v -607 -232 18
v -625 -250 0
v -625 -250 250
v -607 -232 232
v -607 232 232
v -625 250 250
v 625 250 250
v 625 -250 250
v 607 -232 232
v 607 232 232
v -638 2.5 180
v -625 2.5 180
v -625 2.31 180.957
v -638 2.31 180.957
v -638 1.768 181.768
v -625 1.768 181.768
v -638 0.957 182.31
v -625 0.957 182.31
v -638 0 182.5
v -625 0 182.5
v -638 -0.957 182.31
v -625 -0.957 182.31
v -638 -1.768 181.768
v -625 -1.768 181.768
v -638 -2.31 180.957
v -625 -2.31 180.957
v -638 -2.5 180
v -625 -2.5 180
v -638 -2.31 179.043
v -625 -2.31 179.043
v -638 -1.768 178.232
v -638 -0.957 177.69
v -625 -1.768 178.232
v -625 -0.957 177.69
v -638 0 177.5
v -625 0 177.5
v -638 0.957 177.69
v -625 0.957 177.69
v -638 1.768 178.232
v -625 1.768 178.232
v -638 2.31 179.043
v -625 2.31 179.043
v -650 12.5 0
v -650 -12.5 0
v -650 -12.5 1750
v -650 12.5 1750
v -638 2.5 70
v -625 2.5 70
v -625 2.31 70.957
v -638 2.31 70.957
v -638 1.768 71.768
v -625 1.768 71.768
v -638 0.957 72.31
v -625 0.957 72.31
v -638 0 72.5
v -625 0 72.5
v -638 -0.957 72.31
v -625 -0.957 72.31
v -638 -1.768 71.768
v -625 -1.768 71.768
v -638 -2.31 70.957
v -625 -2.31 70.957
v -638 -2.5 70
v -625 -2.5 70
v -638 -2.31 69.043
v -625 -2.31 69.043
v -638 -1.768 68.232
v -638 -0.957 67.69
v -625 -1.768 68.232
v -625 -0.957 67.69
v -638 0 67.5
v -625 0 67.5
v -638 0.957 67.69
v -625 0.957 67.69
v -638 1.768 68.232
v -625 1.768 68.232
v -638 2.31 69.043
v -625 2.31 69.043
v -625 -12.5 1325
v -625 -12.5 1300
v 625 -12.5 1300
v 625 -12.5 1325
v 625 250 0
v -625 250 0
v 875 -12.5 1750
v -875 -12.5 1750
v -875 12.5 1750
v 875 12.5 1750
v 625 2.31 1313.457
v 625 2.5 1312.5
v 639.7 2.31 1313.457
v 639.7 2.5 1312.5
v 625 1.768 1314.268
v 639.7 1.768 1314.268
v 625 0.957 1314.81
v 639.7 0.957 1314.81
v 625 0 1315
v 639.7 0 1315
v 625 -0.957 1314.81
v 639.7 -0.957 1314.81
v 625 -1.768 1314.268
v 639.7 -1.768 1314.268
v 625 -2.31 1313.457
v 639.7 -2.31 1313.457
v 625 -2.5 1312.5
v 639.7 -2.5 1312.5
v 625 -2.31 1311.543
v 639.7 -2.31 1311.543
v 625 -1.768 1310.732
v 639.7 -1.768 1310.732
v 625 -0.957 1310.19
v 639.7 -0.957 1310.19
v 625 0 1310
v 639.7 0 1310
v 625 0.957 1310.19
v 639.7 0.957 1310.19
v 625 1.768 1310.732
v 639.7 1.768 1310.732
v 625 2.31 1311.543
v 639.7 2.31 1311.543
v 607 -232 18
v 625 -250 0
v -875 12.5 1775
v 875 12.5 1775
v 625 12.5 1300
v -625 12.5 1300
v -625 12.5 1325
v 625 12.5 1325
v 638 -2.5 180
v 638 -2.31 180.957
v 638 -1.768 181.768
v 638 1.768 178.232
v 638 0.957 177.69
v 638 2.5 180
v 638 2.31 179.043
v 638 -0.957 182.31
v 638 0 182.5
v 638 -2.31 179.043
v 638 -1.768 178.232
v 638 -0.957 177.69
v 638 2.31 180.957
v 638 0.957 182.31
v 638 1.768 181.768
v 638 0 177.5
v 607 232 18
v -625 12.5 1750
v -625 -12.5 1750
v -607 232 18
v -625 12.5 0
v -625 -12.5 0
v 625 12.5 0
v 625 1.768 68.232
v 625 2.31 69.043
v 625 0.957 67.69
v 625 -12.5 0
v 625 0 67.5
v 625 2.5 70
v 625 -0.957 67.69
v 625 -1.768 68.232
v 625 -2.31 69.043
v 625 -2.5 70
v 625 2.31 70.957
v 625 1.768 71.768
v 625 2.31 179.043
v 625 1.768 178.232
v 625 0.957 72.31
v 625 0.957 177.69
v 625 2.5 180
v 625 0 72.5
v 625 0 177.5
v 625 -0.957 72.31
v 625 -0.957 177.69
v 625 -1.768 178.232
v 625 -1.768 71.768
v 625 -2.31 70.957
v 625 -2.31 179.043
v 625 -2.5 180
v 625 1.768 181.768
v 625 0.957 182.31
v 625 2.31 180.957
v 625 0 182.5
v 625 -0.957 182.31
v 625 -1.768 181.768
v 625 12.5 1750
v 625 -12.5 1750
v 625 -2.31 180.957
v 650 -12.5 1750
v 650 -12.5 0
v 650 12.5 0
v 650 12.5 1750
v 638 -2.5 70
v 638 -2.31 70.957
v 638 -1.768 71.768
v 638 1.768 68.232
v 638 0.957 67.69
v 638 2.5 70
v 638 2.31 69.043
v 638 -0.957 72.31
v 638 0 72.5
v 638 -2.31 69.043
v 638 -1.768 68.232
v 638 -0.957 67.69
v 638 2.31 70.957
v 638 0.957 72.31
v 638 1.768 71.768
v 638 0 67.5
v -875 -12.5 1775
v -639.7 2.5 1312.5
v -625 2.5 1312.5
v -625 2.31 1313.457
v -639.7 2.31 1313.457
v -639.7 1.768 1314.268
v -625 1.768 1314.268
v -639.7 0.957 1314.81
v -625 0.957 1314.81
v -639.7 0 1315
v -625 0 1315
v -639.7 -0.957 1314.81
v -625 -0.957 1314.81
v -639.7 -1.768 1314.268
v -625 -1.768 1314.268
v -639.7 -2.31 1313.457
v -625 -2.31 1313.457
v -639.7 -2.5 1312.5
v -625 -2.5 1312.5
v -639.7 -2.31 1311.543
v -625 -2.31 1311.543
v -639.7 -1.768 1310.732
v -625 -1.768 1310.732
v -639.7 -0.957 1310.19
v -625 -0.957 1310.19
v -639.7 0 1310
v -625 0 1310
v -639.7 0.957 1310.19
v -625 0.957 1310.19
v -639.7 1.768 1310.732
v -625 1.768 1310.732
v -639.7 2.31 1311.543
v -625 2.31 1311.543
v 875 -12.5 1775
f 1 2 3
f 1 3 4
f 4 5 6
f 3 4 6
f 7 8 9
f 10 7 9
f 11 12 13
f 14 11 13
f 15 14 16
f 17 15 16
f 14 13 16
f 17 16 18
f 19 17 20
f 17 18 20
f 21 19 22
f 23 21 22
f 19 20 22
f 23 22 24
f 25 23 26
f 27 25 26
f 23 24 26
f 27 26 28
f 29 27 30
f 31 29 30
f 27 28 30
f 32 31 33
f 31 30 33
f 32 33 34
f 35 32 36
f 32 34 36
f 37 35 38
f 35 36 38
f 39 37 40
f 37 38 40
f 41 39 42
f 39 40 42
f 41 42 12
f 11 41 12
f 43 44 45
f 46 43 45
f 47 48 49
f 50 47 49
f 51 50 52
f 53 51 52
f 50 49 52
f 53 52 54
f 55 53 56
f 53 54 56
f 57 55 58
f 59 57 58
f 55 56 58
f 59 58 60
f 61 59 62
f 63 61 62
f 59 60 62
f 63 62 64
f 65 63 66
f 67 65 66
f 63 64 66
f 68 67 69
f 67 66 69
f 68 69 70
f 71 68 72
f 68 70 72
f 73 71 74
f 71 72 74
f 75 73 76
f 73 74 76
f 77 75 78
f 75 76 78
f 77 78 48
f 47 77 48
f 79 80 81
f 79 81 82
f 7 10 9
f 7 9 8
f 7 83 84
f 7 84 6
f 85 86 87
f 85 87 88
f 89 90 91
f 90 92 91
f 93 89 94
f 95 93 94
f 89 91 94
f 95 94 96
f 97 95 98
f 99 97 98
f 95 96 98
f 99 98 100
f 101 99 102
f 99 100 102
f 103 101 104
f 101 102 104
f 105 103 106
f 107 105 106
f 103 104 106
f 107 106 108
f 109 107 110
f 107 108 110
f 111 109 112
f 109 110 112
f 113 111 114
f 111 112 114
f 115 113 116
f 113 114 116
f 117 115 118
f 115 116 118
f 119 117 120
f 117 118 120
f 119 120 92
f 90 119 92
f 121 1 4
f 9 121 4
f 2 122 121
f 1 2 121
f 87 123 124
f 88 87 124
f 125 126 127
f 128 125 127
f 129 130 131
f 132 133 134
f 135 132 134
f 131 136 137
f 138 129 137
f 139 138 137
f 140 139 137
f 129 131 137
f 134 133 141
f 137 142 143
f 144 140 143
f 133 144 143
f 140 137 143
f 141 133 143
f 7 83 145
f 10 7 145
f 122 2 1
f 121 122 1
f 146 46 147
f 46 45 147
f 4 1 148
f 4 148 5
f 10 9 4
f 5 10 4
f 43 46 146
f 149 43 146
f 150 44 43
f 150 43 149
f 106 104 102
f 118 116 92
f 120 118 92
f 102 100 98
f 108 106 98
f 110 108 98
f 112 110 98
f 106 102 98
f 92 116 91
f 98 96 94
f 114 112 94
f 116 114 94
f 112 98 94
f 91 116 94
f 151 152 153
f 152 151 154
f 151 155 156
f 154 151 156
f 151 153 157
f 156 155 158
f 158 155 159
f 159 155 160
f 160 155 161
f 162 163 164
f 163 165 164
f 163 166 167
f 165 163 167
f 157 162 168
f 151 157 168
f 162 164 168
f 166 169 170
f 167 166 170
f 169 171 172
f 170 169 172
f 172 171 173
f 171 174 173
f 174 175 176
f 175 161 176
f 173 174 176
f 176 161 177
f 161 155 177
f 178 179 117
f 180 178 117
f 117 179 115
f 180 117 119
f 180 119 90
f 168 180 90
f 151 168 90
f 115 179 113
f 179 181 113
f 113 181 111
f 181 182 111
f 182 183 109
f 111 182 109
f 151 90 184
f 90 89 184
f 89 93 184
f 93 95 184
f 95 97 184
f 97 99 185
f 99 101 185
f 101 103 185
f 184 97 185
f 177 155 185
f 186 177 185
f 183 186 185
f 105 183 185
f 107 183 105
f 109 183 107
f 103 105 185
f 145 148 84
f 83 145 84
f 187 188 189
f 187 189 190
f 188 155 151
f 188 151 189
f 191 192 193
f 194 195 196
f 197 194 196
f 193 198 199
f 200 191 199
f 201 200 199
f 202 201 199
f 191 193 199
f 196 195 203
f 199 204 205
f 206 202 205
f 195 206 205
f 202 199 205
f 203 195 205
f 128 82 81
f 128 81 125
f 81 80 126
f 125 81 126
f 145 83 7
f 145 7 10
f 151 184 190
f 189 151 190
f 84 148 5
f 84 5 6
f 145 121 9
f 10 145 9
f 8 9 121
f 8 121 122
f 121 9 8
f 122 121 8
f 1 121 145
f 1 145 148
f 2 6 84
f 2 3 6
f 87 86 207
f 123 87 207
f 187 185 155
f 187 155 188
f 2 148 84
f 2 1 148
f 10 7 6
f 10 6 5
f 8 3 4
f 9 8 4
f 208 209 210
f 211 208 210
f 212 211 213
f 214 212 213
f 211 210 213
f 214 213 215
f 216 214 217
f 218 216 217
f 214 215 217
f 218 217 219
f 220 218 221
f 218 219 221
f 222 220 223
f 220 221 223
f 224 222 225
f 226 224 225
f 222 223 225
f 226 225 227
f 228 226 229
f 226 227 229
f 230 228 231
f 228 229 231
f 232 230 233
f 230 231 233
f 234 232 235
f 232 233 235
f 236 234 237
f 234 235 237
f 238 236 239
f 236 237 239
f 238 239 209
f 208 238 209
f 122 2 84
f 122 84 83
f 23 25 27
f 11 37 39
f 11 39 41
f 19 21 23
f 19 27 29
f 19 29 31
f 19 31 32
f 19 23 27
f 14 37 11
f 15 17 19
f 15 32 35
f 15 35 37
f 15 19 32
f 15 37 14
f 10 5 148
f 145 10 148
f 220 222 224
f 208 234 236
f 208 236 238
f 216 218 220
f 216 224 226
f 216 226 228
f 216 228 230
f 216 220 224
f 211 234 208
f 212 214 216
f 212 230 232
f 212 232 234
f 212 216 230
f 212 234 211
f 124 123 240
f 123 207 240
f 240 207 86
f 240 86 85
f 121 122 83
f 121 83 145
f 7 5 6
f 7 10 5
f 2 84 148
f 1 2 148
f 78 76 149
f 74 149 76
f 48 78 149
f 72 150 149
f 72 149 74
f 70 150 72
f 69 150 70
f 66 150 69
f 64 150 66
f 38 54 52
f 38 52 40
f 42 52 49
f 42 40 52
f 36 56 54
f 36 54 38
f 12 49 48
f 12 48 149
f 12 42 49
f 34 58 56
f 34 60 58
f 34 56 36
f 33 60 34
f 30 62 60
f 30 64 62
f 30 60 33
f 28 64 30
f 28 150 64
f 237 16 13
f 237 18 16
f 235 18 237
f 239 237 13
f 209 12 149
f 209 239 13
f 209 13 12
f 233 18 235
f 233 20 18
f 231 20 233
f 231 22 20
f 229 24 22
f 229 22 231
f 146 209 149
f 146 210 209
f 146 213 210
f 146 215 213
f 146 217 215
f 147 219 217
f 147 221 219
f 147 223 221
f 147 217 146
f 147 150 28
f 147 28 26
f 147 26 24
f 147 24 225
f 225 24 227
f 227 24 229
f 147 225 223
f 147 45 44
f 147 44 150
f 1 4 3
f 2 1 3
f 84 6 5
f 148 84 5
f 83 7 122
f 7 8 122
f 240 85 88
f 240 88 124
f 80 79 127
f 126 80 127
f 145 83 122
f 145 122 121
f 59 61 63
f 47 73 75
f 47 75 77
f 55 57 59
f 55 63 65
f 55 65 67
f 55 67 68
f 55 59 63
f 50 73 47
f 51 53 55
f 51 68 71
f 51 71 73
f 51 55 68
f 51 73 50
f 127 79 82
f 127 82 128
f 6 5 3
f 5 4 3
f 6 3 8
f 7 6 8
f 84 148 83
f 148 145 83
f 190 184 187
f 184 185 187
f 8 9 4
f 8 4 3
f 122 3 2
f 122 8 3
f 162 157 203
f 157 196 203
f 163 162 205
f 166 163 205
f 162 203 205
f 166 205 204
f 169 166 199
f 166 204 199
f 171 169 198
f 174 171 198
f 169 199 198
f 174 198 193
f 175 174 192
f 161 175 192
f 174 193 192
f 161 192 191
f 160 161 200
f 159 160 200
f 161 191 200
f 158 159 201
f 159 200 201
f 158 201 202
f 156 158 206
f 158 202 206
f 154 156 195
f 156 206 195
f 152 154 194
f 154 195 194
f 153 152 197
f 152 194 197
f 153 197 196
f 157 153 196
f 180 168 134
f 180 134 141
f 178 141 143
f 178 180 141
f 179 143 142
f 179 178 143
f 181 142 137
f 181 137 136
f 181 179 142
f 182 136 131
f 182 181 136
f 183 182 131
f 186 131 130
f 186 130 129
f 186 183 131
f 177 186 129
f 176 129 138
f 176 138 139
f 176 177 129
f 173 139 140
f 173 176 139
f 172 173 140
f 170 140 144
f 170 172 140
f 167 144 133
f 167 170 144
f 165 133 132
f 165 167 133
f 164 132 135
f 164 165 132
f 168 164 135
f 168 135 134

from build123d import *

# Parameters (mm, degrees)
F1_DEPTH  = 250
F3_DEPTH  = 714
F5_DEPTH  = 625
F7_DEPTH  = 608
F9_DEPTH  = 250
F11_DEPTH = 534
F15_W     = 25
F15_H     = 1750
F16_DEPTH = 12.5
F17_W     = 1750
F17_H     = 25
F18_DEPTH = 12.5
F19_W     = 25
F19_H     = 25
F20_DEPTH = 1250
F21_R     = 2.5
F22_DEPTH = 638
F23_R     = 2.5
F24_DEPTH = 639.7


with BuildPart() as f1:
    # F0 (on Front) → F1 (new body, symmetric)
    with BuildSketch(Plane.XZ):
        Polygon((-607, 18), (-625, 0), (625, 0), (607, 18), align=None)
    extrude(amount=F1_DEPTH, both=True)

    # F2 (on Right) → F3 (cut, symmetric)
    with BuildSketch(Plane.YZ):
        Polygon((-266.0376429558, 0), (-250, 0), (-231.0939141602, 18.9060858398), (-231.0939141602, 28.4129753709), (-266.0376429558, 28.4129753709), align=None)
        Polygon((231.0939141602, 18.9060858398), (250, 0), (262.9185318947, 0), (262.9185318947, 44.0045437723), (231.0939141602, 44.0045437723), align=None)
    extrude(amount=F3_DEPTH, both=True, mode=Mode.SUBTRACT)


with BuildPart() as f5:
    # F4 (on Right) → F5 (new body, symmetric)
    with BuildSketch(Plane.YZ):
        Polygon((232, 232), (232, 18), (250, 0), (250, 250), align=None)
    extrude(amount=F5_DEPTH, both=True)


with BuildPart() as f5b:
    # F4 (on Right) → F5, piece 2 (new body, symmetric)
    with BuildSketch(Plane.YZ):
        Polygon((-250, 0), (-232, 18), (-232, 232), (-250, 250), align=None)
    extrude(amount=F5_DEPTH, both=True)


with BuildPart() as f7_tool:
    # F6 (on Top) → F7 (new body, symmetric)
    with BuildSketch(Plane.XY):
        Polygon((-607, 232), (-625, 250), (-625, 212.7924200636), (-607, 212.7924200636), align=None)
        Polygon((-625, -250), (-607, -232), (-638.8453841209, -232), (-638.8453841209, -250), align=None)
        Polygon((625, 212.7924200636), (625, 250), (607, 232), (607, 212.7924200636), align=None)
        Polygon((638.8453841209, -250), (638.8453841209, -232), (607, -232), (625, -250), align=None)
    extrude(amount=F7_DEPTH, both=True)


with BuildPart() as f5_1:
    add(f5.part)

    # F7: cut by f7_tool
    add(f7_tool.part, mode=Mode.SUBTRACT)


with BuildPart() as f5b_1:
    add(f5b.part)

    # F7: cut by f7_tool
    add(f7_tool.part, mode=Mode.SUBTRACT)


with BuildPart() as f9:
    # F8 (on Front) → F9 (new body, symmetric)
    with BuildSketch(Plane.XZ):
        Polygon((-625, 250), (-625, 0), (-607, 18), (-607, 232), align=None)
    extrude(amount=F9_DEPTH, both=True)

    # F10 (on Top) → F11 (cut, symmetric)
    with BuildSketch(Plane.XY):
        Polygon((-596.8062881455, -232), (-607, -232), (-625, -250), (-625, -280.7182726889), (-596.8062881455, -280.7182726889), align=None)
        Polygon((-625, 250), (-607, 232), (-596.8062881455, 234.6027734251), (-596.8062881455, 288.4899377823), (-625, 288.4899377823), align=None)
    extrude(amount=F11_DEPTH, both=True, mode=Mode.SUBTRACT)


with BuildPart() as f12_1:
    # F12: instance of F9
    add(f9.part.mirror(Plane.YZ))


with BuildPart() as f14_1:
    # F14: instance of F1
    add(f1.part.mirror(Plane.XY.offset(125)))


with BuildPart() as f16:
    # F15 (on Front) → F16 (new body, symmetric)
    with BuildSketch(Plane.XZ):
        with Locations((637.5, 875)):
            Rectangle(F15_W, F15_H)
    extrude(amount=F16_DEPTH, both=True)


with BuildPart() as f16b:
    # F15 (on Front) → F16, piece 2 (new body, symmetric)
    with BuildSketch(Plane.XZ):
        with Locations((-637.5, 875)):
            Rectangle(F15_W, F15_H)
    extrude(amount=F16_DEPTH, both=True)


with BuildPart() as f18:
    # F17 (on Front) → F18 (new body, symmetric)
    with BuildSketch(Plane.XZ):
        with Locations((0, 1762.5)):
            Rectangle(F17_W, F17_H)
    extrude(amount=F18_DEPTH, both=True)


with BuildPart() as f20:
    # F19 (on face) → F20 (new body, through all)
    with BuildSketch(Plane.YZ.offset(-625)):
        with Locations((0, 1312.5)):
            Rectangle(F19_W, F19_H)
    extrude(amount=F20_DEPTH)


with BuildPart() as f22_tool:
    # F21 (on Right) → F22 (new body, symmetric)
    with BuildSketch(Plane.YZ):
        with Locations((0, 180)):
            Circle(F21_R)
        with Locations((0, 70)):
            Circle(F21_R)
    extrude(amount=F22_DEPTH, both=True)


with BuildPart() as f16_1:
    add(f16.part)

    # F22: cut by f22_tool
    add(f22_tool.part, mode=Mode.SUBTRACT)


with BuildPart() as f16b_1:
    add(f16b.part)

    # F22: cut by f22_tool
    add(f22_tool.part, mode=Mode.SUBTRACT)


with BuildPart() as f24_tool:
    # F23 (on Right) → F24 (new body, symmetric)
    with BuildSketch(Plane.YZ):
        with Locations((0, 1312.5)):
            Circle(F23_R)
    extrude(amount=F24_DEPTH, both=True)


with BuildPart() as f16_2:
    add(f16_1.part)

    # F24: cut by f24_tool
    add(f24_tool.part, mode=Mode.SUBTRACT)


with BuildPart() as f16b_2:
    add(f16b_1.part)

    # F24: cut by f24_tool
    add(f24_tool.part, mode=Mode.SUBTRACT)


solid = Compound([f1.part, f5_1.part, f5b_1.part, f9.part, f12_1.part, f14_1.part, f18.part, f20.part, f16_2.part, f16b_2.part])
